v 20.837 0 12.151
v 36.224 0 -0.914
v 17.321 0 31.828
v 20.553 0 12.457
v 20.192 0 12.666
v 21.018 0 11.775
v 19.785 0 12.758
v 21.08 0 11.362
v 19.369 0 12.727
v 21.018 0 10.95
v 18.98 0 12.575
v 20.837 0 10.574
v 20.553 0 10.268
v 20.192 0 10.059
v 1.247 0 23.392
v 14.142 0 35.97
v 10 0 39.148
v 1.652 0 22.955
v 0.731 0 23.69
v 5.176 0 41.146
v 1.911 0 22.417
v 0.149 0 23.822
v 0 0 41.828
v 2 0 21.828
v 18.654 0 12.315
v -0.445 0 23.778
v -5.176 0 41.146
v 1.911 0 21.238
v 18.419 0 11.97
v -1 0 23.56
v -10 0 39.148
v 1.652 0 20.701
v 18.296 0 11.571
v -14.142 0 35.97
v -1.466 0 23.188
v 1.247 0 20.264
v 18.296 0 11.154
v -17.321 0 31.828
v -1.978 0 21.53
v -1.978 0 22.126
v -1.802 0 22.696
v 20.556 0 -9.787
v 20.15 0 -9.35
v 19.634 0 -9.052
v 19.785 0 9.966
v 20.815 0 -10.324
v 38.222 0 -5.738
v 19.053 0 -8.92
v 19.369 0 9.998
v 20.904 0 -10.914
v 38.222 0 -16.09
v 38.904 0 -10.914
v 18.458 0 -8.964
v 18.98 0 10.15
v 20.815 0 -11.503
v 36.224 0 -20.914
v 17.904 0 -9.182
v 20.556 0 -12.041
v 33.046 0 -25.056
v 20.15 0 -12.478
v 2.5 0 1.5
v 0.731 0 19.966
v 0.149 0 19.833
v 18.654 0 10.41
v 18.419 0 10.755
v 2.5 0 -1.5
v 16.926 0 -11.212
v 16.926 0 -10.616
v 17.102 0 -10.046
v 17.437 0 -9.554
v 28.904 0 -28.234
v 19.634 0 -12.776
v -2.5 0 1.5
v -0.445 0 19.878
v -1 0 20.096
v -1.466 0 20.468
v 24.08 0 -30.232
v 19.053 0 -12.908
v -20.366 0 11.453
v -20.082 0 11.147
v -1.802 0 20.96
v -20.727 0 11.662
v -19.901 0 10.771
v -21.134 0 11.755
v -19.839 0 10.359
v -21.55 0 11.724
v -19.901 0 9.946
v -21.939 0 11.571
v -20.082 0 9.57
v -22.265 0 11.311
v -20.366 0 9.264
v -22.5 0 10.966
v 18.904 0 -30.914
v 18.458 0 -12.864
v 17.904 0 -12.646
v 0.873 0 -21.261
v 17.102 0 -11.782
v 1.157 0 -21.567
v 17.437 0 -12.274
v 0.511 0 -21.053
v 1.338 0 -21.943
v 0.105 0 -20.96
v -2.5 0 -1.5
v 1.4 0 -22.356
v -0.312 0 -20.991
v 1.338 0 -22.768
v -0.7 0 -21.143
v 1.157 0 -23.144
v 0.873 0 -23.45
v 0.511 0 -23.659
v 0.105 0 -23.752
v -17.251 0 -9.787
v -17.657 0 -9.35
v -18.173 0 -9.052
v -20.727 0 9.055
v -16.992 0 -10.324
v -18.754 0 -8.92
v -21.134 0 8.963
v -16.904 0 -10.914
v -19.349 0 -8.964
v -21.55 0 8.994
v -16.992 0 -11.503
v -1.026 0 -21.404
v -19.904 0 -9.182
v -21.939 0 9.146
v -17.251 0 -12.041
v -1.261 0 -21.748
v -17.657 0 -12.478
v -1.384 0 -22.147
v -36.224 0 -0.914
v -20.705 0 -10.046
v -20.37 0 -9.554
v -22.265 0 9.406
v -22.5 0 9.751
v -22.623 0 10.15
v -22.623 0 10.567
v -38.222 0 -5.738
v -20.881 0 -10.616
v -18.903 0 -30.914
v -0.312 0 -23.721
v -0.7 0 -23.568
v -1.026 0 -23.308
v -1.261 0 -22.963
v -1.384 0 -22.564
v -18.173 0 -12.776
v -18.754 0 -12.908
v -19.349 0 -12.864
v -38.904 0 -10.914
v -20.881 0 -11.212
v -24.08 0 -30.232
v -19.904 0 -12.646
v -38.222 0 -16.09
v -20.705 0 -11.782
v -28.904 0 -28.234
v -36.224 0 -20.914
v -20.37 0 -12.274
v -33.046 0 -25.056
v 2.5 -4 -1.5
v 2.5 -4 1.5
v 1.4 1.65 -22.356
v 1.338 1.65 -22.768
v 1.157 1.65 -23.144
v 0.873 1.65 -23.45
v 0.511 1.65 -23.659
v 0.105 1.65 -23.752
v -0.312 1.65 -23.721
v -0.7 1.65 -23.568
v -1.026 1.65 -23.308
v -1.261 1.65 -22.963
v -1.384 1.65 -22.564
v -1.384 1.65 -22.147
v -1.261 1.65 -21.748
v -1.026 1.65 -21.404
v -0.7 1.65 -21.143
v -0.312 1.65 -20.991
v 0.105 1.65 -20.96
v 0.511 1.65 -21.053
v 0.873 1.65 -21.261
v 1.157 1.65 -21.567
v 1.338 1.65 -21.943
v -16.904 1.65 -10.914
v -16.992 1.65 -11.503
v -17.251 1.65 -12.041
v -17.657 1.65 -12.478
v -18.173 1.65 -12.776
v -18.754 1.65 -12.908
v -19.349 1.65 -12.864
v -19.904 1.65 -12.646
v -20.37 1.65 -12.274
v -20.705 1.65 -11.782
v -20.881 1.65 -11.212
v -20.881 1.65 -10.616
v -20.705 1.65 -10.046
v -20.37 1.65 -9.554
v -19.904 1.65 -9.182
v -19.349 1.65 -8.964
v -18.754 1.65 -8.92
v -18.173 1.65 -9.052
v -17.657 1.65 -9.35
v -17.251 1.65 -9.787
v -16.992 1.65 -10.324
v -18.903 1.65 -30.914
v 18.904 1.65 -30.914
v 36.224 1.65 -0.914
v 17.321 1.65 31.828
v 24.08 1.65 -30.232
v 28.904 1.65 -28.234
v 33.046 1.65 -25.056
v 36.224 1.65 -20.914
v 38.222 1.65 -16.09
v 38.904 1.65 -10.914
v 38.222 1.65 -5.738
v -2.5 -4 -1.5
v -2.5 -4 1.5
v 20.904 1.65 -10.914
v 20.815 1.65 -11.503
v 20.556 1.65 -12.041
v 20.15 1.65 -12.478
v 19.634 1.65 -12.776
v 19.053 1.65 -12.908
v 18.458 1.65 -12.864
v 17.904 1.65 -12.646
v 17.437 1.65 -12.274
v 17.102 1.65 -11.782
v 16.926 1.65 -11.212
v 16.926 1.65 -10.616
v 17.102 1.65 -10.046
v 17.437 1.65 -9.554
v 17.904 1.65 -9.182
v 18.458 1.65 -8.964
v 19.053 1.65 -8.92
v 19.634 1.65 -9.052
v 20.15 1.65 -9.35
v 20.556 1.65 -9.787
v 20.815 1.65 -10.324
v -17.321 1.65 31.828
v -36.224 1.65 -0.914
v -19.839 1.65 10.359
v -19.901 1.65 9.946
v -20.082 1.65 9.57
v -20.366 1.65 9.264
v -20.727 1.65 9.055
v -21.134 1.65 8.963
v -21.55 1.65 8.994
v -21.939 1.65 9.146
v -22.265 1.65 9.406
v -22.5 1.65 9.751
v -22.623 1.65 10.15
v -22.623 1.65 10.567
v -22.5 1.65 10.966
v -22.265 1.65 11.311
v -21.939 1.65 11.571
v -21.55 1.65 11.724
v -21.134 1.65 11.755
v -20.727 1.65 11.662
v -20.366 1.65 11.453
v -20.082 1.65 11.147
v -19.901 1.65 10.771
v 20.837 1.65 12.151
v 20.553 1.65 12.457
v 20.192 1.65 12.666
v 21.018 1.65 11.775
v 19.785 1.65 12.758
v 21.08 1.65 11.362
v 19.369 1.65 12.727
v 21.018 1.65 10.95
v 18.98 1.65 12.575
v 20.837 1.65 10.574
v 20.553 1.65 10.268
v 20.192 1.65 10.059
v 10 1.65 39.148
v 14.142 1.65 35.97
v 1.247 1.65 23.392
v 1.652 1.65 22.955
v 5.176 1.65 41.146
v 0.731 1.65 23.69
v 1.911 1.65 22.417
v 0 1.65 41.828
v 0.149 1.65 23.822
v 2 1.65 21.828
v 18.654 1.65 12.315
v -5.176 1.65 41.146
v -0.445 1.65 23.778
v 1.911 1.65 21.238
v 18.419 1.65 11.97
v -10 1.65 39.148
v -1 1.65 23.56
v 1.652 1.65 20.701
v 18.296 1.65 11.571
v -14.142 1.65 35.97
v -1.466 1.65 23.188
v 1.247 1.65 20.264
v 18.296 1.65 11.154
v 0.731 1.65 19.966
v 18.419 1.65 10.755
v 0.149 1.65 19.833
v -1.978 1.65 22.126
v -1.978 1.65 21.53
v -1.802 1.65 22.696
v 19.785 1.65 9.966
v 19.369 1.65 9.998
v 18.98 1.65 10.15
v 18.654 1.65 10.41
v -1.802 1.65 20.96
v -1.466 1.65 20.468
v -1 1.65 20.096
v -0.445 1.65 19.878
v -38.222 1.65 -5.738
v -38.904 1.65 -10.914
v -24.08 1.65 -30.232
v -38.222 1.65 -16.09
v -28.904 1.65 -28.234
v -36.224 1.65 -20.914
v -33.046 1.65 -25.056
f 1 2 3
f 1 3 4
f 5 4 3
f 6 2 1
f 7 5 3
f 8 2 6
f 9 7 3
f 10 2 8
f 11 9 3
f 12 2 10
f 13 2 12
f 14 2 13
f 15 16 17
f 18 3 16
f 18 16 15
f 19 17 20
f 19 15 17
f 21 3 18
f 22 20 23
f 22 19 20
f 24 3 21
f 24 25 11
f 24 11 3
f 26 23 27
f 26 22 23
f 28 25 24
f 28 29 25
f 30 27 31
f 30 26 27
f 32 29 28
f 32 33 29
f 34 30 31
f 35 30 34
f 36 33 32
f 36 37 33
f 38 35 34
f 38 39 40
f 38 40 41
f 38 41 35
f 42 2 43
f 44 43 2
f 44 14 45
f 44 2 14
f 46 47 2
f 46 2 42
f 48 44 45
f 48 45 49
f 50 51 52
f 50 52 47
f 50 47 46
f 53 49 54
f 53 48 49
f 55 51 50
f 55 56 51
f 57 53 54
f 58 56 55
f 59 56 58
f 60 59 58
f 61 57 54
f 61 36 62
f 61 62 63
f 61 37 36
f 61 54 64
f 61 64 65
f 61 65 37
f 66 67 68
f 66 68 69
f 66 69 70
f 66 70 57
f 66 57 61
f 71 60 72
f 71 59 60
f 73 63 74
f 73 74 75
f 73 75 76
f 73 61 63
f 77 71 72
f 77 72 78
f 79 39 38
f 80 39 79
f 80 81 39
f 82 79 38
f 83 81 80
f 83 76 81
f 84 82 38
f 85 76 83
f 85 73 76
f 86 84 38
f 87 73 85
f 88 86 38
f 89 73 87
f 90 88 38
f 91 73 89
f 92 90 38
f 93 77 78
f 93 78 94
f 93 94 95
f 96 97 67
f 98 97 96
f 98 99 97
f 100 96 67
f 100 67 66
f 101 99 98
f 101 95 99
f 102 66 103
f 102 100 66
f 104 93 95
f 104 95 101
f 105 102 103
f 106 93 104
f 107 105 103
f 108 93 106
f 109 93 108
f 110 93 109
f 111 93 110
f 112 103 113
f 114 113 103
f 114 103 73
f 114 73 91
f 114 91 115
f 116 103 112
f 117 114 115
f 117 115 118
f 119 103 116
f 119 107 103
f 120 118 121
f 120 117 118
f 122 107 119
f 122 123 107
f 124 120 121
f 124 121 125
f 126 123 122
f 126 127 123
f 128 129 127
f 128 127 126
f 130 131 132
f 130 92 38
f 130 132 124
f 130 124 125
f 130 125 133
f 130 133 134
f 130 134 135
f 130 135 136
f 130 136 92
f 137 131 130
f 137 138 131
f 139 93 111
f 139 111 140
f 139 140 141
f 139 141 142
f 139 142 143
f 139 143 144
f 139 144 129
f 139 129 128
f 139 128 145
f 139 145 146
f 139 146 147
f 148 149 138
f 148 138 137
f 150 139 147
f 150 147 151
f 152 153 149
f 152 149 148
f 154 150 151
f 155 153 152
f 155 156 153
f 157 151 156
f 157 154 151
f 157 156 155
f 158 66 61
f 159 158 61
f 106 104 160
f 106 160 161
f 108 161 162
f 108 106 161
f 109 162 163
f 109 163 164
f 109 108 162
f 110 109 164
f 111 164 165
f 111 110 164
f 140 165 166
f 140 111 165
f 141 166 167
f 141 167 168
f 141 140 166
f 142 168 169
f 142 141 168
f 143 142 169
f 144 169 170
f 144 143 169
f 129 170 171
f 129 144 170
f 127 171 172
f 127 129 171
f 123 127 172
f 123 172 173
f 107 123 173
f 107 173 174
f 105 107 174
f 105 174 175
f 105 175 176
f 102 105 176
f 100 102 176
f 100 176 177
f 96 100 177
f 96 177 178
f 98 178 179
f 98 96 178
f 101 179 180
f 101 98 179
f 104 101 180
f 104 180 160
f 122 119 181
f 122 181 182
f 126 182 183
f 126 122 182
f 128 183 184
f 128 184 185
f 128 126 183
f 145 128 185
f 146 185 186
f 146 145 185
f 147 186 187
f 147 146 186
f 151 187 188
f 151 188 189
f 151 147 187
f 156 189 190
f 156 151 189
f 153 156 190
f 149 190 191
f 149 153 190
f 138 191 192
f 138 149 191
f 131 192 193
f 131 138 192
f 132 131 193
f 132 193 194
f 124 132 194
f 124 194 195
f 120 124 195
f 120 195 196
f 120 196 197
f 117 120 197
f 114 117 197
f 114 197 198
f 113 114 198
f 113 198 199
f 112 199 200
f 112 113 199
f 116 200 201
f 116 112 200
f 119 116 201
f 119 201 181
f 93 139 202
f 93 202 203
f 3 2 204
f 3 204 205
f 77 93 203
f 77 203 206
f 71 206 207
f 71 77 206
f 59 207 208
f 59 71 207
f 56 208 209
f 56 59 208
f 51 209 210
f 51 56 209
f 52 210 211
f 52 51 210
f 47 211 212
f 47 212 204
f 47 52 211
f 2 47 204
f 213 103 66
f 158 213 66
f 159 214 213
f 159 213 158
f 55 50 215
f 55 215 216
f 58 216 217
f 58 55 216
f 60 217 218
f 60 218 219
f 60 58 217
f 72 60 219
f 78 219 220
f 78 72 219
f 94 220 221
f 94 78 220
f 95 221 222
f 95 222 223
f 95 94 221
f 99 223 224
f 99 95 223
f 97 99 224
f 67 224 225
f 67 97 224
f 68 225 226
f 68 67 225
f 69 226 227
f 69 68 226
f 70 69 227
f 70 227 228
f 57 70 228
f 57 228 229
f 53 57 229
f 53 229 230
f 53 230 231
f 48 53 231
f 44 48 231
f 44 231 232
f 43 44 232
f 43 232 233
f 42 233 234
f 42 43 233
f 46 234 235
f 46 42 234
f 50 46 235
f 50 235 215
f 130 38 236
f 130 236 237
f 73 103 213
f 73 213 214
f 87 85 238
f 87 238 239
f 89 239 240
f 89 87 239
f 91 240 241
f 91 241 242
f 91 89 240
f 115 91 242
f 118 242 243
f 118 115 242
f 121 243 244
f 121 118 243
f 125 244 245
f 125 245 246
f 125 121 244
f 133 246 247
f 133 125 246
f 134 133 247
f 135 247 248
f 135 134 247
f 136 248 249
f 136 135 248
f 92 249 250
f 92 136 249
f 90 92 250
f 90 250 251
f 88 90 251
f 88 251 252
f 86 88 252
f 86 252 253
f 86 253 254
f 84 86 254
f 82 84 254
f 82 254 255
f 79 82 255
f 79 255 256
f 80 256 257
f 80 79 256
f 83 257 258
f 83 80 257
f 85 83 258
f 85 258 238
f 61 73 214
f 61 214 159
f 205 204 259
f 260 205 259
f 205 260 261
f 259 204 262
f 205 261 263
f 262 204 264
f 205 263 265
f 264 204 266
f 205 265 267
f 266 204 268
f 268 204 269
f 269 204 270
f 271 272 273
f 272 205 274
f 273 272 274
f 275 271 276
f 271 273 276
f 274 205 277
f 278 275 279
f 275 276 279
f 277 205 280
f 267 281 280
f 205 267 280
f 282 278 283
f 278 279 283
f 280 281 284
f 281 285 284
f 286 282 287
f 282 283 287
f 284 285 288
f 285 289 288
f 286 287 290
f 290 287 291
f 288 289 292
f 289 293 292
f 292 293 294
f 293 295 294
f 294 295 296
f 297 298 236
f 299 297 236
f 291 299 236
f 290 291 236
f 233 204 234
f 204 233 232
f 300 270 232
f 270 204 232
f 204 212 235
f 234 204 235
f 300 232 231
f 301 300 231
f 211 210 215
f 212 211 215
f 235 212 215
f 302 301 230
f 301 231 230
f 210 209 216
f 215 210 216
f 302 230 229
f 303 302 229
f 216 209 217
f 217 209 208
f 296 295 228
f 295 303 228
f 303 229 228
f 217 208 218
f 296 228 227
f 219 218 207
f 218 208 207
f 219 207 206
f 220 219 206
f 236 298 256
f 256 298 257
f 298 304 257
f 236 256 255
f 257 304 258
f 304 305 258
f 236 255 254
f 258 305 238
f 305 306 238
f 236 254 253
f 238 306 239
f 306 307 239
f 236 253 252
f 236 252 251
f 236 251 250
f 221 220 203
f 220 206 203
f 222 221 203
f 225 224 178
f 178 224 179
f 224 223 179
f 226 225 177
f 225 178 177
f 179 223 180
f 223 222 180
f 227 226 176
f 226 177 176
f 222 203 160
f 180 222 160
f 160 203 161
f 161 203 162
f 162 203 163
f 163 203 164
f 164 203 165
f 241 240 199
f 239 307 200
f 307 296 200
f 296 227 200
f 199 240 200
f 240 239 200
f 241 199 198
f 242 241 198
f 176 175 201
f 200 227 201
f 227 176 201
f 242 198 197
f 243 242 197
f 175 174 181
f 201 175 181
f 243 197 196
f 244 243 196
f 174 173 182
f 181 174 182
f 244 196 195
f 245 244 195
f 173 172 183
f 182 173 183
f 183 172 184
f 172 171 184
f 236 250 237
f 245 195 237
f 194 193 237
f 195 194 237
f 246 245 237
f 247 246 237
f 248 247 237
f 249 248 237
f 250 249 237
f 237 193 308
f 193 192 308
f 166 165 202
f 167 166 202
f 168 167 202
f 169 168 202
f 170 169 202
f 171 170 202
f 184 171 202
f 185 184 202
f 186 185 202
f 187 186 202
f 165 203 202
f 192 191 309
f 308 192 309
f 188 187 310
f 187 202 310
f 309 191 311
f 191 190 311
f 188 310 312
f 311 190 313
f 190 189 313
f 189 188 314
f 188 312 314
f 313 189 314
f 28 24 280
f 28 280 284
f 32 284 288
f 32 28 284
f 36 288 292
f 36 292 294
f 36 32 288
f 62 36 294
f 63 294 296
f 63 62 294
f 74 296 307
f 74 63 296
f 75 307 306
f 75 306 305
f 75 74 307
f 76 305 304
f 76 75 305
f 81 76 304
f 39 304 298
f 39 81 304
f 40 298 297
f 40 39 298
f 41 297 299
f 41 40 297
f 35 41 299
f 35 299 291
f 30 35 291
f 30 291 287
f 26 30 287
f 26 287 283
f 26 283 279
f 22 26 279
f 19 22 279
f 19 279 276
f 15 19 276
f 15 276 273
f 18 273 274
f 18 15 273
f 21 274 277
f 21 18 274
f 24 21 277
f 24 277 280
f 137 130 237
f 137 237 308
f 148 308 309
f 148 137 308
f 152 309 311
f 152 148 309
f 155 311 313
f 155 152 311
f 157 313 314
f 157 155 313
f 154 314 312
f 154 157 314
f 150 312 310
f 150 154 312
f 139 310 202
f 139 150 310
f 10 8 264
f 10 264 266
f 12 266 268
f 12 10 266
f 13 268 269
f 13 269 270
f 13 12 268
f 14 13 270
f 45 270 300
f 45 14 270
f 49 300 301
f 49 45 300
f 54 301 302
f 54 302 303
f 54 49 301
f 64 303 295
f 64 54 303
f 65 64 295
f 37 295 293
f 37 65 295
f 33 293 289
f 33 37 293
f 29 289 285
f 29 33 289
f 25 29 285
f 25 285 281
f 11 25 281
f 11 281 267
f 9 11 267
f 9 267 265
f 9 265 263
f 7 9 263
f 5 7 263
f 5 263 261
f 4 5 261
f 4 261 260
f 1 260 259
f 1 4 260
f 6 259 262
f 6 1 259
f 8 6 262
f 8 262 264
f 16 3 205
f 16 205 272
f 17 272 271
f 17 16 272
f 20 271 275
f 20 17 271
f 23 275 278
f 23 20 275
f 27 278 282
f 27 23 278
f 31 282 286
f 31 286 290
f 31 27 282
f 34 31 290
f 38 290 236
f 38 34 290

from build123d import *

# Parameters (mm, degrees)
SKETCH1_R           = 2
SKETCH1_R_2         = 1.4
BOSS_EXTRUDE1_DEPTH = 1.65
SKETCH2_W           = 5
SKETCH2_H           = 3
BOSS_EXTRUDE2_DEPTH = 4


with BuildPart() as part:
    # Sketch1 → Boss-Extrude1 (new body)
    with BuildSketch(Plane(origin=(0, 0, 0), x_dir=(1, 0, 0), z_dir=(0, 1, 0))):
        with BuildLine():
            Line((36.224008076, 0.913940814), (17.320508076, -31.827881627))
            ThreePointArc((17.320508076, -31.827881627), (0, -41.827881627), (-17.320508076, -31.827881627))
            Line((-17.320508076, -31.827881627), (-36.224008076, 0.913940814))
            ThreePointArc((-36.224008076, 0.913940814), (-36.224008076, 20.913940814), (-18.9035, 30.913940814))
            Line((-18.9035, 30.913940814), (18.9035, 30.913940814))
            ThreePointArc((18.9035, 30.913940814), (36.224008076, 20.913940814), (36.224008076, 0.913940814))
        make_face()
        with Locations((-18.9035, 10.913940814)):
            Circle(SKETCH1_R, mode=Mode.SUBTRACT)
        with Locations((18.9035, 10.913940814)):
            Circle(SKETCH1_R, mode=Mode.SUBTRACT)
        with Locations((0, -21.827881627)):
            Circle(SKETCH1_R, mode=Mode.SUBTRACT)
        with Locations((-21.238503314, -10.358710199)):
            Circle(SKETCH1_R_2, mode=Mode.SUBTRACT)
        with Locations((19.680254096, -11.3624)):
            Circle(SKETCH1_R_2, mode=Mode.SUBTRACT)
        with Locations((0, 22.3558)):
            Circle(SKETCH1_R_2, mode=Mode.SUBTRACT)
    extrude(amount=BOSS_EXTRUDE1_DEPTH)

    # Sketch2 → Boss-Extrude2 (add)
    with BuildSketch(Plane.XZ):
        Rectangle(SKETCH2_W, SKETCH2_H)
    extrude(amount=BOSS_EXTRUDE2_DEPTH)


solid = part.part
